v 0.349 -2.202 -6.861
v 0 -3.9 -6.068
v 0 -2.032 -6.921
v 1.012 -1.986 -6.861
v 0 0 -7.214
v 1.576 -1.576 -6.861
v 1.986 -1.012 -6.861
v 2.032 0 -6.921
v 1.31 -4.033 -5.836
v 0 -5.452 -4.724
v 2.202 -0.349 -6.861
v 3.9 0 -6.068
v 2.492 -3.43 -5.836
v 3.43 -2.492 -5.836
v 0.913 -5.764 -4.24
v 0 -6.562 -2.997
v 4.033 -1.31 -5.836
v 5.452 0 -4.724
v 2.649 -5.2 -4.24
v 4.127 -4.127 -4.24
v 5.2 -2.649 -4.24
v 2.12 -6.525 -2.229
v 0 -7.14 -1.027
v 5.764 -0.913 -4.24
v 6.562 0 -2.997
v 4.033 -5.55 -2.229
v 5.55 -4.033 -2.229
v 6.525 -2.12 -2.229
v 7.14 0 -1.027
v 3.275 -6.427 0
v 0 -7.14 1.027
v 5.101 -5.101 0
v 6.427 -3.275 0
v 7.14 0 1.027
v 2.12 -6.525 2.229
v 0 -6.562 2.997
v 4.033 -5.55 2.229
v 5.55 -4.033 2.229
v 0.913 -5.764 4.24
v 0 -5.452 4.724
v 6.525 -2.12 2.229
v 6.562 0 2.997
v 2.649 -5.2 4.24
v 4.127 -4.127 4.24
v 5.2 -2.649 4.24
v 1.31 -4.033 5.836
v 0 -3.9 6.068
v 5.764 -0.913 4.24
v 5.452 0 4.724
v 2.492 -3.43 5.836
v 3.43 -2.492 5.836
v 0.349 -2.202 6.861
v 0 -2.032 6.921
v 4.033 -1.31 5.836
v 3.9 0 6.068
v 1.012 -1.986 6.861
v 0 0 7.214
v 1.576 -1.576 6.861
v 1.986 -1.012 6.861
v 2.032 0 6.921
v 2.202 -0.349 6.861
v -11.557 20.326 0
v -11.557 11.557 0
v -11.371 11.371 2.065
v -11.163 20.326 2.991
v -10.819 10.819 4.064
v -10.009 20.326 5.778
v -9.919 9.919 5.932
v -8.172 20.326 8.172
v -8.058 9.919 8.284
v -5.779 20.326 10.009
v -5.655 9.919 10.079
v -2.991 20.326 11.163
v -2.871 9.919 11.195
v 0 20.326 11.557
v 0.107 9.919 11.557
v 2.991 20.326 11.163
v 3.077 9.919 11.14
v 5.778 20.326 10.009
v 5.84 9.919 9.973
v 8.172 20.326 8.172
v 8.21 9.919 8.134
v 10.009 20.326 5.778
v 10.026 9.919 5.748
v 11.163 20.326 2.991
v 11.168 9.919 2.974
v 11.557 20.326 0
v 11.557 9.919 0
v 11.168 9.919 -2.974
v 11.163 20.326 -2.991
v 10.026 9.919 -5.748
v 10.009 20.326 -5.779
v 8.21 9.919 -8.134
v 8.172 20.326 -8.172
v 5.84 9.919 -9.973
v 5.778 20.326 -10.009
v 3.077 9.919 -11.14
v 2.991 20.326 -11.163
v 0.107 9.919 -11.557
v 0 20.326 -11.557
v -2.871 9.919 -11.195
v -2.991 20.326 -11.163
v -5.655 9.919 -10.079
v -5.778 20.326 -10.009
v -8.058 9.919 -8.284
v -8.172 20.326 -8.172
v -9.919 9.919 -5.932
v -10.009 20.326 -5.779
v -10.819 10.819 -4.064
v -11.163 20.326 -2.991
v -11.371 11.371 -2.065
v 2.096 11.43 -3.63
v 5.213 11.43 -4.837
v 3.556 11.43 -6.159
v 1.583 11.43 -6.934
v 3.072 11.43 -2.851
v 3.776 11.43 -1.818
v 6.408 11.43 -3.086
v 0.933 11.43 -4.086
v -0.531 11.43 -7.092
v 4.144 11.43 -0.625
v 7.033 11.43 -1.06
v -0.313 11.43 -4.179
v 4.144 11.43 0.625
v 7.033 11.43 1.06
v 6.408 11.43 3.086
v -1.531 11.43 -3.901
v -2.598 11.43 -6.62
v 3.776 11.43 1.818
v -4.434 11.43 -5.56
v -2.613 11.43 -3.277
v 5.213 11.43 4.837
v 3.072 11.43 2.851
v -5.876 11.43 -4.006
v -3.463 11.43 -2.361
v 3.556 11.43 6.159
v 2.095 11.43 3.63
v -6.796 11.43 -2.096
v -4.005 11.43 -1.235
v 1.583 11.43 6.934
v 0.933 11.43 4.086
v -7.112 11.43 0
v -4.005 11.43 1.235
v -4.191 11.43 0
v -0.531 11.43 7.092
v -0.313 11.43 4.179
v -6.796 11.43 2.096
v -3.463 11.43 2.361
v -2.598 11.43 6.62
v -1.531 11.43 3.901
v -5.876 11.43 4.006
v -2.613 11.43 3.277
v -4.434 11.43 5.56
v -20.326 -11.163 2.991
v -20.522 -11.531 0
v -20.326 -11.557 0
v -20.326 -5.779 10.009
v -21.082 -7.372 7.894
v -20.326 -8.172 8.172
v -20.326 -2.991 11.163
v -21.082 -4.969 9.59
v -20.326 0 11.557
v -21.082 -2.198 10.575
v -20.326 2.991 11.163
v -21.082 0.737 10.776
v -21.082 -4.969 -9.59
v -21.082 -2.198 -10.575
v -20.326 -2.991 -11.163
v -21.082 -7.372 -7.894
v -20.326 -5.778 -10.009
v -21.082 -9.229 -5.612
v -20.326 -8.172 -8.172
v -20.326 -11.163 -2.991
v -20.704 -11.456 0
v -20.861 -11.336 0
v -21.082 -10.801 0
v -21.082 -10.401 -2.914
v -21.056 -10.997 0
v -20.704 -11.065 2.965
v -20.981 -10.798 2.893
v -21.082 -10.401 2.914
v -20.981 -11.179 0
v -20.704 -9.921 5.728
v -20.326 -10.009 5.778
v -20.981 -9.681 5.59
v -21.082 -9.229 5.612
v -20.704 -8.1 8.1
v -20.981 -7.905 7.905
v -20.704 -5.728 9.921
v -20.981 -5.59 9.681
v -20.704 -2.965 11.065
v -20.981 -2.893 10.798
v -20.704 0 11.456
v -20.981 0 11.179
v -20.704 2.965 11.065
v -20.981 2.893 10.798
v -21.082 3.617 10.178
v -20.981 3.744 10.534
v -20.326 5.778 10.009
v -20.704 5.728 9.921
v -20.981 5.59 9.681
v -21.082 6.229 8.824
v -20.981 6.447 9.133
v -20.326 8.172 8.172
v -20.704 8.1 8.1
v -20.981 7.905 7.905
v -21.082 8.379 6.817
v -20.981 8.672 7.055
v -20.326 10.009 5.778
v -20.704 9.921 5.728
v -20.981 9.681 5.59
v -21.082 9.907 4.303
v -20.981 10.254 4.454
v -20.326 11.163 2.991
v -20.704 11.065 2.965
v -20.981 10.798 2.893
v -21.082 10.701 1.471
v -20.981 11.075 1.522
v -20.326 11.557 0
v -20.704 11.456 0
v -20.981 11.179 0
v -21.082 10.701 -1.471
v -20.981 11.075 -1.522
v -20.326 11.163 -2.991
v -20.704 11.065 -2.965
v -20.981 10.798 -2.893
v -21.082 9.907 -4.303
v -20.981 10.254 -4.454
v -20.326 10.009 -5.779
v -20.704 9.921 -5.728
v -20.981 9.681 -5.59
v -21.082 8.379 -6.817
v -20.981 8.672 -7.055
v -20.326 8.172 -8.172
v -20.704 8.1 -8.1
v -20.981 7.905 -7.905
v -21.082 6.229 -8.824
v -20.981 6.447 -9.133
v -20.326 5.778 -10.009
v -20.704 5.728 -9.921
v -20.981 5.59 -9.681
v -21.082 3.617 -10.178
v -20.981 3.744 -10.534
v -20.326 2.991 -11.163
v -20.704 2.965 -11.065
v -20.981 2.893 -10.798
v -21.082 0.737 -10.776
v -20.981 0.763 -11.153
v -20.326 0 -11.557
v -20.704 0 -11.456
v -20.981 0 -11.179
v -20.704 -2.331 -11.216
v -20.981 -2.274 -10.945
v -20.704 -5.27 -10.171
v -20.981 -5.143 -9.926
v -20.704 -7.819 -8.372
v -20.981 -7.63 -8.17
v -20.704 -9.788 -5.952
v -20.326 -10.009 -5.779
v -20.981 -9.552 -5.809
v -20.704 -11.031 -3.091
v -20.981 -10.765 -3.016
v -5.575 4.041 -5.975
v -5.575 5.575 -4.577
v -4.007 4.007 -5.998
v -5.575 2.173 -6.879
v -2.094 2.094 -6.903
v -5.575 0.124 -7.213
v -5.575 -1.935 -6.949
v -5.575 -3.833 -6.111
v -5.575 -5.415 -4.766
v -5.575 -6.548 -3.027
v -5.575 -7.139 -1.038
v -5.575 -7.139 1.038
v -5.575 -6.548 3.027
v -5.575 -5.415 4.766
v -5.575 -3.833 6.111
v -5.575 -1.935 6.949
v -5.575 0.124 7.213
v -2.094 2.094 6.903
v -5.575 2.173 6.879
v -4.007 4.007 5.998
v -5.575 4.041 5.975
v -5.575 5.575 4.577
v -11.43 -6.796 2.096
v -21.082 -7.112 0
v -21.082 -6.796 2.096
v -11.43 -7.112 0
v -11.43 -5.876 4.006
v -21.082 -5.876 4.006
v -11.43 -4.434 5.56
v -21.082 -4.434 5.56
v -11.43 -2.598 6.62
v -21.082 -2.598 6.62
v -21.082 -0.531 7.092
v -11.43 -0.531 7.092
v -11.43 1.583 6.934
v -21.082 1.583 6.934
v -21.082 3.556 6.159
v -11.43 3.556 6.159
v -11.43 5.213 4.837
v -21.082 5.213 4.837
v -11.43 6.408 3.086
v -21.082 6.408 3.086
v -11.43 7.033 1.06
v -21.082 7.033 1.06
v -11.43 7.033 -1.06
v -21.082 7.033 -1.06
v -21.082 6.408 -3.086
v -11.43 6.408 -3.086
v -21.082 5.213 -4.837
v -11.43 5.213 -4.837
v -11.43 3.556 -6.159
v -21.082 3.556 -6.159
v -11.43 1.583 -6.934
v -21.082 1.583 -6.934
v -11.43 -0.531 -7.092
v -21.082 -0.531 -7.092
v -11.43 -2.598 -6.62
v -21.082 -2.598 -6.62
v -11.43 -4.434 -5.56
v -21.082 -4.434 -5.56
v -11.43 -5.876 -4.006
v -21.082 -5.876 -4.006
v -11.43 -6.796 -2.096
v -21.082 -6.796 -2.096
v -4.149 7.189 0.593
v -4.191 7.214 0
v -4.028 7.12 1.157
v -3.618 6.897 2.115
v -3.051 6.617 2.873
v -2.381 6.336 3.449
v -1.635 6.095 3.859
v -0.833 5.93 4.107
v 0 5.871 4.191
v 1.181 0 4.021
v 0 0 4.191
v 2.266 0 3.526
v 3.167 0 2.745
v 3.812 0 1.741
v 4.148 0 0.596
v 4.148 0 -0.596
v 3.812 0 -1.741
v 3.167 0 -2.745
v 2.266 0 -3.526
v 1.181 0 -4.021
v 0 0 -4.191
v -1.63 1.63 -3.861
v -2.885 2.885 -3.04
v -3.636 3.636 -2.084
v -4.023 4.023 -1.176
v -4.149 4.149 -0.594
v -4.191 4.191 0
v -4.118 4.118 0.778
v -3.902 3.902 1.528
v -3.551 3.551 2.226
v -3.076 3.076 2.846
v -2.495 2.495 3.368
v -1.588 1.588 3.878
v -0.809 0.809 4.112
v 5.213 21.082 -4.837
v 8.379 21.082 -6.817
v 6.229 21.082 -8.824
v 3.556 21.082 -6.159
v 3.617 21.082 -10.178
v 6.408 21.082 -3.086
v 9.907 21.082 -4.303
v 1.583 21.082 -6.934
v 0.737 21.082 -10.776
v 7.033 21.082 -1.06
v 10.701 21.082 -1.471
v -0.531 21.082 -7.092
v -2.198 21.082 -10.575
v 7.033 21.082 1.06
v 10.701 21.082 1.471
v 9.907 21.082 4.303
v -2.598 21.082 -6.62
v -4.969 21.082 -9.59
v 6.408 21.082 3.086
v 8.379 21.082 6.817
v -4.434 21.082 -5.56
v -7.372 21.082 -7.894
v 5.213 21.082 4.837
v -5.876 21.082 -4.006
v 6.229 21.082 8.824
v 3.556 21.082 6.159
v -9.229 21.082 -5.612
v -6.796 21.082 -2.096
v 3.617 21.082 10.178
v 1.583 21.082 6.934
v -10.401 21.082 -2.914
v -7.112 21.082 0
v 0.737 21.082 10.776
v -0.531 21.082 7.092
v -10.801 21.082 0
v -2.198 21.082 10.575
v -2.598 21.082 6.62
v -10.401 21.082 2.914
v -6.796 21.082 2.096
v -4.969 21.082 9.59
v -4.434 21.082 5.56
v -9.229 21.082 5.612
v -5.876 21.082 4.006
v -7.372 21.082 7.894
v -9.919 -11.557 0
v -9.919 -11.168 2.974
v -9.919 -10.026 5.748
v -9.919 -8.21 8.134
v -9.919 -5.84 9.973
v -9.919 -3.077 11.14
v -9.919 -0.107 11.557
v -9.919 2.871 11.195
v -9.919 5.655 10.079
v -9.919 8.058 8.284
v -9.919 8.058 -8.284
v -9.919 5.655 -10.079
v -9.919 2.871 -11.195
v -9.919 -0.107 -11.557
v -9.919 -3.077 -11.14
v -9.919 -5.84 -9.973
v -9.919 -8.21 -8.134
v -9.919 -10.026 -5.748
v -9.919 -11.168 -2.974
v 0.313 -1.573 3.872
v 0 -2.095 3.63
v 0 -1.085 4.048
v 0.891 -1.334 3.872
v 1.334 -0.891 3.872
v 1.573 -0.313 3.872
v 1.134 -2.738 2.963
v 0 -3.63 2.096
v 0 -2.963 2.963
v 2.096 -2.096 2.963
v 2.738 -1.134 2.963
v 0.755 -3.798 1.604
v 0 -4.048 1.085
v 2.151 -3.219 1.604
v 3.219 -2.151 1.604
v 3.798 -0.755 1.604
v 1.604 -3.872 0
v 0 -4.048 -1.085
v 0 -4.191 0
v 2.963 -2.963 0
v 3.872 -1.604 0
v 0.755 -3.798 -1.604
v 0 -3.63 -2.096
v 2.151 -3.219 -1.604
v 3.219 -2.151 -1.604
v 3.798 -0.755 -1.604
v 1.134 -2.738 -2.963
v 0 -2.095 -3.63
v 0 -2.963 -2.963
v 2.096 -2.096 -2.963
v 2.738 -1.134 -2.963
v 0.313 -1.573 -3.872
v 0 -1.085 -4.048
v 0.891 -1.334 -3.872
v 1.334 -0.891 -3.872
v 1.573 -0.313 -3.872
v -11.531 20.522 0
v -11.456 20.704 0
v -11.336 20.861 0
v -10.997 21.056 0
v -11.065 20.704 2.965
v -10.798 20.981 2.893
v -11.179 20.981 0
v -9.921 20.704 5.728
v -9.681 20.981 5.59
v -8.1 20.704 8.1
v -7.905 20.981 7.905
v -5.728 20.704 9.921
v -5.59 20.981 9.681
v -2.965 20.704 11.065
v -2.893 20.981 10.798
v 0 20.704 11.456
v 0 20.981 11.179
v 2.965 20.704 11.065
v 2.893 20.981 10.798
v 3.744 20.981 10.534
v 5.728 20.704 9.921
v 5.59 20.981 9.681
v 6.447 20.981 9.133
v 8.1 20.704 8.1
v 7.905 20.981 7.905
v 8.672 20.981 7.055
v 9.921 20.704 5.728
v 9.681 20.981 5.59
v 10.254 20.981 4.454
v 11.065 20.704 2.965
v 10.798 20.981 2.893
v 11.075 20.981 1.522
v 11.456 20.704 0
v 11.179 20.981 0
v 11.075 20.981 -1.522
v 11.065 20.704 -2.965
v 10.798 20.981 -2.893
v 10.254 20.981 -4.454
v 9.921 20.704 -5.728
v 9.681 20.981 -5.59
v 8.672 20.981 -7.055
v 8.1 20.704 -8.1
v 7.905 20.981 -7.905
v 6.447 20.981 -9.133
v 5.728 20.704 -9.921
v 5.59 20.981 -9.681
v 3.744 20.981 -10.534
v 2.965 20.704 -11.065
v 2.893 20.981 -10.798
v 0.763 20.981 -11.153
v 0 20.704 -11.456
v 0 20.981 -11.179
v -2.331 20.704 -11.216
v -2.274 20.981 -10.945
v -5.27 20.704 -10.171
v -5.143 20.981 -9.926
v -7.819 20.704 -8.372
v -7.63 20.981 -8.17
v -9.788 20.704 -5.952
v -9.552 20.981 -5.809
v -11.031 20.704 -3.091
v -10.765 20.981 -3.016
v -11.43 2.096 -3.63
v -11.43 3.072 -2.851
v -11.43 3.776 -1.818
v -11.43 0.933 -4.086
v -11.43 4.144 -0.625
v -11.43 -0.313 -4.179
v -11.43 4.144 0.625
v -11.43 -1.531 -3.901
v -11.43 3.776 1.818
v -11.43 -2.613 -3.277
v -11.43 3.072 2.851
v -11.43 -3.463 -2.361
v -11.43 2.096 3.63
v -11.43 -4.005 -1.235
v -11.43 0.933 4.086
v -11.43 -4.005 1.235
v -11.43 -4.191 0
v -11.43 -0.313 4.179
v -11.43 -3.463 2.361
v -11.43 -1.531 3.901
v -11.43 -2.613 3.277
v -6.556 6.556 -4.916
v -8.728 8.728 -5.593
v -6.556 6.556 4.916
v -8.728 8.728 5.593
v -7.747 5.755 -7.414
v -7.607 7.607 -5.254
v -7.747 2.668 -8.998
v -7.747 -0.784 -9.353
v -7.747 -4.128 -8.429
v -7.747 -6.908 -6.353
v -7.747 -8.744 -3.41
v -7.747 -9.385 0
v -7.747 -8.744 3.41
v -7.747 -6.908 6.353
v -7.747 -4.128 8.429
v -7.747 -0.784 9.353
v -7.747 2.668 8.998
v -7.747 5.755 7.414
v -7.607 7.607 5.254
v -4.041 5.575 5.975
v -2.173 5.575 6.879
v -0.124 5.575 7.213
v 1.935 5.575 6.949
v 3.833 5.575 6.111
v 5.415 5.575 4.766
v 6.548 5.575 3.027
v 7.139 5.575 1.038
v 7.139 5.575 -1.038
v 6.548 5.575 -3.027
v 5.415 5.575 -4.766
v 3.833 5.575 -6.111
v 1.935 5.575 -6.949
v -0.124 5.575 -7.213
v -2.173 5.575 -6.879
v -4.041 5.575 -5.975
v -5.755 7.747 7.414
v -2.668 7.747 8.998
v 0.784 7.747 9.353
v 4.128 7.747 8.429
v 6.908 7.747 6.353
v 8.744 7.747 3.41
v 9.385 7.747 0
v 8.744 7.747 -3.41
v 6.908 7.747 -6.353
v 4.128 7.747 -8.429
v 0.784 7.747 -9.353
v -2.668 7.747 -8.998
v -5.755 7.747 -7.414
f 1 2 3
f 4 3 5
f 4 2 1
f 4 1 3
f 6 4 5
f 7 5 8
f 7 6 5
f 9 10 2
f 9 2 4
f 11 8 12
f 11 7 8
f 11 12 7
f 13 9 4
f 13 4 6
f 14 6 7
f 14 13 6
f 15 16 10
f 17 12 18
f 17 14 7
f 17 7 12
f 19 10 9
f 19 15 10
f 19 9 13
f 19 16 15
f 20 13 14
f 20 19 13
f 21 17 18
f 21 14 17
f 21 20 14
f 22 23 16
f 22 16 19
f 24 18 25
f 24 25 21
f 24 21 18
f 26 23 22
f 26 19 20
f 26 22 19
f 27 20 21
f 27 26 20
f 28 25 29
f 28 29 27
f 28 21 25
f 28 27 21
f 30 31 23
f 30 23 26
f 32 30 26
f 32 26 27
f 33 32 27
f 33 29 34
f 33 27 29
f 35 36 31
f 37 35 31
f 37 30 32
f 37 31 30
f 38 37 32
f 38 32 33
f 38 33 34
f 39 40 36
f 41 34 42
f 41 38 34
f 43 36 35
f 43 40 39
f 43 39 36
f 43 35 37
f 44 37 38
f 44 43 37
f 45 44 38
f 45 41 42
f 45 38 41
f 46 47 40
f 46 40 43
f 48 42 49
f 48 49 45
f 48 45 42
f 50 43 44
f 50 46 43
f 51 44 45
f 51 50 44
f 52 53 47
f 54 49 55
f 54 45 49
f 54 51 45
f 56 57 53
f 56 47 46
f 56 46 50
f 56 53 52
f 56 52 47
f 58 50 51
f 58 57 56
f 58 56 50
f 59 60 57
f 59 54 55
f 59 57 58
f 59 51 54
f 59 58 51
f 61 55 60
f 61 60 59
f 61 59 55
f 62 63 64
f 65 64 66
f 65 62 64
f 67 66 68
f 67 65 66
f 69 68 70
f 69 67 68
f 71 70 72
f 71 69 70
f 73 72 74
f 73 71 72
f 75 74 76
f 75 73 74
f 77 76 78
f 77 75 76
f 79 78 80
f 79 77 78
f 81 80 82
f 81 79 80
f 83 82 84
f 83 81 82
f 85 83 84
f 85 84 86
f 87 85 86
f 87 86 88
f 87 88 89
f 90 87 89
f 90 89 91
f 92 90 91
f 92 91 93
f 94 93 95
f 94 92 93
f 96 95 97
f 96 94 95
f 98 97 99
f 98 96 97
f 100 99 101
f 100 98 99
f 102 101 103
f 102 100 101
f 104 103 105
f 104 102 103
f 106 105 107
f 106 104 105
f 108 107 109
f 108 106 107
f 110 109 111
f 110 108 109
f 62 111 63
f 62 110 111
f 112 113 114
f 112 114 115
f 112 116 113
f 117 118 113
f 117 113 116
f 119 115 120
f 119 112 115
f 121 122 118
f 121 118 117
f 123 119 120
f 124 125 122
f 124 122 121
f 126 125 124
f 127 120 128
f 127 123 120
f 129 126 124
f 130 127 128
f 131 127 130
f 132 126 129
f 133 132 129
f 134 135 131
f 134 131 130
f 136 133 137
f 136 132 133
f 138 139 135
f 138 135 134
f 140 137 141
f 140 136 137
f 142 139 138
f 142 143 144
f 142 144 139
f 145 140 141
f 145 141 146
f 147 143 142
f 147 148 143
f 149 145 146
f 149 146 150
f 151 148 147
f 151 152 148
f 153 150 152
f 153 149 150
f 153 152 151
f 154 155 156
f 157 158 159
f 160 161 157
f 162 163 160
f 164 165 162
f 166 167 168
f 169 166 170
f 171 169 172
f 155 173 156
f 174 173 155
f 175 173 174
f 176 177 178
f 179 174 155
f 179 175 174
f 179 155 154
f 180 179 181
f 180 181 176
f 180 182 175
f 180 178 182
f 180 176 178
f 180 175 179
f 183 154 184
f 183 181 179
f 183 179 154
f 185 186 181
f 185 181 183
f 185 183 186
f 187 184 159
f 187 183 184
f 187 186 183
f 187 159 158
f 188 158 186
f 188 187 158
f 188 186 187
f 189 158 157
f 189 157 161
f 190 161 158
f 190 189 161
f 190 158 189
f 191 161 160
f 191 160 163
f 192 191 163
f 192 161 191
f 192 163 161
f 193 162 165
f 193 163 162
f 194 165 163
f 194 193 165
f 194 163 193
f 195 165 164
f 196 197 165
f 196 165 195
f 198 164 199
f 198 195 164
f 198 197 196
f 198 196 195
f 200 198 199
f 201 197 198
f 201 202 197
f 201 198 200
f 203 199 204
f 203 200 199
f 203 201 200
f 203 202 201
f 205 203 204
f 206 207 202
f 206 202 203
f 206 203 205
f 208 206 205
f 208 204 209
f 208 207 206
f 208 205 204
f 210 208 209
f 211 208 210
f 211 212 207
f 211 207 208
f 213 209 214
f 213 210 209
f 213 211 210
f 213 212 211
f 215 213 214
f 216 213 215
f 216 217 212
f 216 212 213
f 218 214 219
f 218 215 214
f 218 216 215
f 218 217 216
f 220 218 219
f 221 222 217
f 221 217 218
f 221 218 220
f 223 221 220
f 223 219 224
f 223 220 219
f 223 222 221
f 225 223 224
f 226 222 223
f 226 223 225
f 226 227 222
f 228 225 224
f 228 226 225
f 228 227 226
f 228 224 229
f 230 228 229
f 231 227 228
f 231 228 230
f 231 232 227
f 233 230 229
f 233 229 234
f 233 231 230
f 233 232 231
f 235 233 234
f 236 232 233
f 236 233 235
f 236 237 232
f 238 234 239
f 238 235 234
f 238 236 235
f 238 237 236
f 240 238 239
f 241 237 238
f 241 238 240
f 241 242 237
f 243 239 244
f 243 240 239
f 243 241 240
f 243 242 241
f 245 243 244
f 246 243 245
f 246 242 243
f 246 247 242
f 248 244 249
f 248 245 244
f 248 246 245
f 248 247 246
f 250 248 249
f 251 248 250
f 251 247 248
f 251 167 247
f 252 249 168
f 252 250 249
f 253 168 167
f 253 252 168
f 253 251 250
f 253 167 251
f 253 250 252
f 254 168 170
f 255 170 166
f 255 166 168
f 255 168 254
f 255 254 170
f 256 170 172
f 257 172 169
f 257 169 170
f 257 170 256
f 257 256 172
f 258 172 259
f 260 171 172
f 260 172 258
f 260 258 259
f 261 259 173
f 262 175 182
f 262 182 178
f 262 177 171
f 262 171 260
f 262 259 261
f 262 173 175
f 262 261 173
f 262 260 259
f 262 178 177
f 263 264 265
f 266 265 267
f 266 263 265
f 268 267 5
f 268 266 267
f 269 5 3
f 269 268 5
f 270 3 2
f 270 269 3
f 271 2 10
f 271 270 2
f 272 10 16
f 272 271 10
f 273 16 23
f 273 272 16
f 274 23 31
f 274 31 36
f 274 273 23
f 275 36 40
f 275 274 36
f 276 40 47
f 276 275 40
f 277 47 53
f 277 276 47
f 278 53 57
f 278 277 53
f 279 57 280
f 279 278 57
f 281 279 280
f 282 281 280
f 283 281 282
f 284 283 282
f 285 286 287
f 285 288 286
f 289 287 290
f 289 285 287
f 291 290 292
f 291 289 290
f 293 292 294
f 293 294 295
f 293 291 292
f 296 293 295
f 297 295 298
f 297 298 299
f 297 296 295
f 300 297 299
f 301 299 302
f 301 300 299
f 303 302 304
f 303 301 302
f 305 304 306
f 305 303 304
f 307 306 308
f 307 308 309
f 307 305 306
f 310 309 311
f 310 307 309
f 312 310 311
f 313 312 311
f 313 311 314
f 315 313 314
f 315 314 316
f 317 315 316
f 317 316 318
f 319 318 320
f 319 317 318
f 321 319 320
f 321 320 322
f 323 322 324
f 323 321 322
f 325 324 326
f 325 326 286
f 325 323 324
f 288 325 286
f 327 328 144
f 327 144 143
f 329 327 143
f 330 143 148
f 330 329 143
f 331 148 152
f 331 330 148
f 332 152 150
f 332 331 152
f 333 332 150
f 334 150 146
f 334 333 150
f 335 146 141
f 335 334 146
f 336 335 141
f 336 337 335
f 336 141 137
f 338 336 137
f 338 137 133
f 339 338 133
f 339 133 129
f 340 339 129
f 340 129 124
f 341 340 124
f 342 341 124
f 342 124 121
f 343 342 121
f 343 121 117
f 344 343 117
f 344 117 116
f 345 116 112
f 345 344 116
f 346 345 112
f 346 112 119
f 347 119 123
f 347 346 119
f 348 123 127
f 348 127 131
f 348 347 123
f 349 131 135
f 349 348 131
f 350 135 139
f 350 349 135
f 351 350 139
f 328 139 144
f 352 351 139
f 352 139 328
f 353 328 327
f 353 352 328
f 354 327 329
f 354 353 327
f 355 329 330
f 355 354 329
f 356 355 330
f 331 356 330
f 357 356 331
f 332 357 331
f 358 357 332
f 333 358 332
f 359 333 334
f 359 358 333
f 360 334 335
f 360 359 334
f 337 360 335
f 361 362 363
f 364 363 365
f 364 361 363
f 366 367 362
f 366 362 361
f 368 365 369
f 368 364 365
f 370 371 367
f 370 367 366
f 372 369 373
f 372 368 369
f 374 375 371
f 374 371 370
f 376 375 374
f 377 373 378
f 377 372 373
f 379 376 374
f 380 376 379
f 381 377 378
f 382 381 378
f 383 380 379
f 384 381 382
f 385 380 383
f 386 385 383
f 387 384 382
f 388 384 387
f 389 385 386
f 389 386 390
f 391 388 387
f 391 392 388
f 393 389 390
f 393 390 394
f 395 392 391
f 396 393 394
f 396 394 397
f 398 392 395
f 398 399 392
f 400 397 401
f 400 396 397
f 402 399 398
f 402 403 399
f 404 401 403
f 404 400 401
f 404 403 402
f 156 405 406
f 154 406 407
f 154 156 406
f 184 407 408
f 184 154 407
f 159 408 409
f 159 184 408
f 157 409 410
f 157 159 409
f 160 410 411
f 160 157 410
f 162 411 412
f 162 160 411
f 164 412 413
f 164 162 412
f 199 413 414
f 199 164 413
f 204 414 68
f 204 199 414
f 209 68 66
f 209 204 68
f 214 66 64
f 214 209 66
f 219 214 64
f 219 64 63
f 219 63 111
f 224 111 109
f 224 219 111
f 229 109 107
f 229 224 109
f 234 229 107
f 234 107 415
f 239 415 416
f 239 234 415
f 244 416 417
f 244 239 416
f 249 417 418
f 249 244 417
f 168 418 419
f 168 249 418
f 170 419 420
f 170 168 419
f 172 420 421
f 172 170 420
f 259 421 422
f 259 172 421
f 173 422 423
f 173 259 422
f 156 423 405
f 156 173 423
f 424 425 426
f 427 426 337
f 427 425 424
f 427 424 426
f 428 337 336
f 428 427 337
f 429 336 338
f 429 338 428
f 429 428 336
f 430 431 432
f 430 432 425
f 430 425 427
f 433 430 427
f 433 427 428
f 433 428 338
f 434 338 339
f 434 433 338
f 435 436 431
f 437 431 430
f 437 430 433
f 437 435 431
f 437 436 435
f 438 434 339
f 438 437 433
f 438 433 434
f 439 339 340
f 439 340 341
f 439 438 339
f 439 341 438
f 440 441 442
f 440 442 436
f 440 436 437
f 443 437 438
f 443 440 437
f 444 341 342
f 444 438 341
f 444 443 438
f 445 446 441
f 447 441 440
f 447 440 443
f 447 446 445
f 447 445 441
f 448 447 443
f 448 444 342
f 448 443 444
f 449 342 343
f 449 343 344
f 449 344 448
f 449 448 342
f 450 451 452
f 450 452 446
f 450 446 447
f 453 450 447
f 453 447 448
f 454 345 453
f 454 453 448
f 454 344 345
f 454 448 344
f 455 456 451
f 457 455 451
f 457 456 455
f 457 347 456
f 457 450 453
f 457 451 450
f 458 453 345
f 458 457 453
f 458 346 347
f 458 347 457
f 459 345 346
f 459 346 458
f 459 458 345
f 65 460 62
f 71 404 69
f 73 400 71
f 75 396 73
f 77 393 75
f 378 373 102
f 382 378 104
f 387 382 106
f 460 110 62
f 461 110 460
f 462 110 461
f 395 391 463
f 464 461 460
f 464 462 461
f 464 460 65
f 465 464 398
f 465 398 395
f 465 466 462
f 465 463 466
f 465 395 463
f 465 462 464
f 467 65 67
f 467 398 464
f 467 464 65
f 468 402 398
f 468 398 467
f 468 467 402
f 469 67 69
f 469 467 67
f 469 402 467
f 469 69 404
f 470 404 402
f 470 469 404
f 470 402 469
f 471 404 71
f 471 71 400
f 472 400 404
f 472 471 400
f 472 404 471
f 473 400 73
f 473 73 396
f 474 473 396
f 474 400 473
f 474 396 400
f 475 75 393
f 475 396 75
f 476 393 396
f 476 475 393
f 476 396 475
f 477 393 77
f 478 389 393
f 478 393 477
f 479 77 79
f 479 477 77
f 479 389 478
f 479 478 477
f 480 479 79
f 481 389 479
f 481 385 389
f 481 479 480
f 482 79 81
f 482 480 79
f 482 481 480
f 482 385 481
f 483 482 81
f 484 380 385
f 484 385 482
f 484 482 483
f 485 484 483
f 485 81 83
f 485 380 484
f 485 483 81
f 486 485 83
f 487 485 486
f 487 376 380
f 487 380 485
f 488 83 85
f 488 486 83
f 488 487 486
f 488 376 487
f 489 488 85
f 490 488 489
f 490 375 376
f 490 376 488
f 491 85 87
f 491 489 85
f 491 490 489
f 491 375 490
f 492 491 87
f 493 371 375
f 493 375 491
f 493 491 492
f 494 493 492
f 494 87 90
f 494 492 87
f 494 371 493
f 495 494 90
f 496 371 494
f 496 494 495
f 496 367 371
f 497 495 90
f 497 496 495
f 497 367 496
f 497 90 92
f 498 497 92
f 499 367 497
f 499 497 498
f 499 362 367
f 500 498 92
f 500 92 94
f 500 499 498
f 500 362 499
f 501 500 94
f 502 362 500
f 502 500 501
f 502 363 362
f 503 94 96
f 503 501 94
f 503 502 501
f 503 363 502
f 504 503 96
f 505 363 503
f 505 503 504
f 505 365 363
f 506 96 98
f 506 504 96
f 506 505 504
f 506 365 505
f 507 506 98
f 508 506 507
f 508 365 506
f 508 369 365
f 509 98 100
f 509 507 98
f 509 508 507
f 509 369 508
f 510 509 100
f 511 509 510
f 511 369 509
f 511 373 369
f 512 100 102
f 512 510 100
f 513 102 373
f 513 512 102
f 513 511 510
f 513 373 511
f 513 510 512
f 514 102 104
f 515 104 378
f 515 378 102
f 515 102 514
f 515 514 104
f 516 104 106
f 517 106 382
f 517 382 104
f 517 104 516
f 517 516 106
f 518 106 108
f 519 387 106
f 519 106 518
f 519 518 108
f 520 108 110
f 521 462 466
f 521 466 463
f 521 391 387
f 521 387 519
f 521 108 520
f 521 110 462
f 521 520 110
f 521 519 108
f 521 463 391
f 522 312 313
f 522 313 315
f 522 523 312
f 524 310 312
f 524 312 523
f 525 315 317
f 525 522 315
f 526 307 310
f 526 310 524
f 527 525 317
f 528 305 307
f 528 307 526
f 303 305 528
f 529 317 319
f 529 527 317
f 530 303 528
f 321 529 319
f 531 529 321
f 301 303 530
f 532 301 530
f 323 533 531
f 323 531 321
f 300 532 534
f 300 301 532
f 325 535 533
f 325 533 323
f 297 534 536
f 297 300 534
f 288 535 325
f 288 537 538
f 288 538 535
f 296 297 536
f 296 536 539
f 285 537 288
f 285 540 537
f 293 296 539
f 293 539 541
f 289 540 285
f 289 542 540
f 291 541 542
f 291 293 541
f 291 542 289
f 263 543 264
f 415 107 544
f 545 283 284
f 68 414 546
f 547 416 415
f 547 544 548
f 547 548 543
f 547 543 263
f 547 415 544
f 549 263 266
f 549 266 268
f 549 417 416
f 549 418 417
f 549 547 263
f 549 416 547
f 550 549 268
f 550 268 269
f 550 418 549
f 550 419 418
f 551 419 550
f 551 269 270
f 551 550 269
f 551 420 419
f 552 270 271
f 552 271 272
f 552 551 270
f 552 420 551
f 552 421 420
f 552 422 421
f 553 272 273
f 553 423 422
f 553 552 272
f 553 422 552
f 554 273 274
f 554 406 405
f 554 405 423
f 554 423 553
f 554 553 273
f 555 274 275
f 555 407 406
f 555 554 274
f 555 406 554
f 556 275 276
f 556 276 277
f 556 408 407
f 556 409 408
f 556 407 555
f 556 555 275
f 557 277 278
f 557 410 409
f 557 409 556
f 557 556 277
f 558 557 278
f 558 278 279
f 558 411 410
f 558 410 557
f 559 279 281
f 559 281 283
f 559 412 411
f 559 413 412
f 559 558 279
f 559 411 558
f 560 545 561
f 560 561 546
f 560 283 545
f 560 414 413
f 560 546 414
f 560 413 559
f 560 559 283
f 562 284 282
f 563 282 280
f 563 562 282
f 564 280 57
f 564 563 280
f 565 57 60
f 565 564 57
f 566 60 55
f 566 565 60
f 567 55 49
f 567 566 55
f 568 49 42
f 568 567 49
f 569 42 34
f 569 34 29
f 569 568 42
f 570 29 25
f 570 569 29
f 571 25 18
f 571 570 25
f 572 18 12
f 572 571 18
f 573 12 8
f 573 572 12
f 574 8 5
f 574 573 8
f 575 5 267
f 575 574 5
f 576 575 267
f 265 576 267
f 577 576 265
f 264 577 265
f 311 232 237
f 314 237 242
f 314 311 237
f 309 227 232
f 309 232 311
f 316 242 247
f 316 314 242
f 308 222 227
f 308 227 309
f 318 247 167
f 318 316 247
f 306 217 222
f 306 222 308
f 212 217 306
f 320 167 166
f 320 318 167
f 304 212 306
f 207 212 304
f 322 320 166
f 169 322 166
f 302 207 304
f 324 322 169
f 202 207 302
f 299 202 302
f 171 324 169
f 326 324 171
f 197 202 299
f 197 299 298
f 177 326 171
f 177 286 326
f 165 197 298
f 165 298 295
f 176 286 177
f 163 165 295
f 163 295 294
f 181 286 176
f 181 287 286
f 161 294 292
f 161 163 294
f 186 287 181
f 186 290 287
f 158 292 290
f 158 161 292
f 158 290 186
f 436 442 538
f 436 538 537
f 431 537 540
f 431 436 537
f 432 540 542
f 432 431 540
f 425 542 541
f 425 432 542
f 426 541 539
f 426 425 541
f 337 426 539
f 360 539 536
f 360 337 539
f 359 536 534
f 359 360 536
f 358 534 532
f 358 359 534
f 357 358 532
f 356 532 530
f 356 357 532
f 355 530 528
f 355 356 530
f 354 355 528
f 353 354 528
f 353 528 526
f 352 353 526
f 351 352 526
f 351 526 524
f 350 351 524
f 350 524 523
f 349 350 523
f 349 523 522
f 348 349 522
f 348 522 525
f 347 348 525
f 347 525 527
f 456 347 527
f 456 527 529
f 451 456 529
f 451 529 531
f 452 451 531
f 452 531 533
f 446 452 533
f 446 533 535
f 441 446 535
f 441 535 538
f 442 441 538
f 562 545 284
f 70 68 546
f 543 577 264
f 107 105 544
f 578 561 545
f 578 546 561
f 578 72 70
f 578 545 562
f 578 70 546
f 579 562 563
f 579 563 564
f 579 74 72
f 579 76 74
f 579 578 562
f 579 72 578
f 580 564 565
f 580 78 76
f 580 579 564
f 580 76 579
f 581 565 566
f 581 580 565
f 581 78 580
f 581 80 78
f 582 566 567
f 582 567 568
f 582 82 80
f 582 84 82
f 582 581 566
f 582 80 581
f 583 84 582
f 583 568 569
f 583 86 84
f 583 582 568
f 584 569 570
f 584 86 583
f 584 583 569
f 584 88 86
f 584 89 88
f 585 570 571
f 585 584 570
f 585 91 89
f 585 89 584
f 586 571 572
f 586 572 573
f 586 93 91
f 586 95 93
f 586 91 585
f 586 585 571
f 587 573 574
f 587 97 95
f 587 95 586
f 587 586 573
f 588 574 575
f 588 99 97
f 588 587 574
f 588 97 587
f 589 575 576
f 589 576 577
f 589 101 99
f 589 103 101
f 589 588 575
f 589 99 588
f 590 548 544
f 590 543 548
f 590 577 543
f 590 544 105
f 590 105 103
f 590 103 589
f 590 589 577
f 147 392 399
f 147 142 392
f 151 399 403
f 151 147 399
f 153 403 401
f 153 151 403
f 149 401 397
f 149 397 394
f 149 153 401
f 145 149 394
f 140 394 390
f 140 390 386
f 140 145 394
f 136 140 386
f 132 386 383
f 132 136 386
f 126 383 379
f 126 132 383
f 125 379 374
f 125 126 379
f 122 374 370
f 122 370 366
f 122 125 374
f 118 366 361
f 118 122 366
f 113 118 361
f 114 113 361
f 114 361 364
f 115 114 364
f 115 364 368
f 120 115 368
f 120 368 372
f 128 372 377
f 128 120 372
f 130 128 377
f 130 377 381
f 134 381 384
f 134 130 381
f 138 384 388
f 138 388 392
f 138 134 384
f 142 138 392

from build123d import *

# Parameters (mm, degrees)
CIRPATTERN2_COUNT  = 2
CIRPATTERN2_ANGLE  = 90
SKETCH4_R          = 4.191
CUT_EXTRUDE1_DEPTH = 22.082
SKETCH5_R          = 4.191
CUT_EXTRUDE2_DEPTH = 22.082
REVOLVE2_ANGLE     = 90


with BuildPart() as part:
    # Sketch2 → Revolve1 (revolve)
    with BuildSketch(Plane.XY):
        with BuildLine():
            Line((-21.082, -7.112), (-11.43, -7.112))
            Line((-11.43, -7.112), (-11.43, -4.191))
            Line((-11.43, -4.191), (0, -4.191))
            Line((0, -4.191), (0, -7.2136))
            Line((0, -7.2136), (-5.5753, -7.2136))
            Line((-5.5753, -7.2136), (-9.9187, -11.557))
            Line((-9.9187, -11.557), (-20.32635, -11.557))
            ThreePointArc((-20.32635, -11.557), (-20.860675239, -11.335675239), (-21.082, -10.80135))
            Line((-21.082, -10.80135), (-21.082, -7.112))
        make_face()
    revolve(axis=Axis((0, 0, 0), (-1, 0, 0)))


with BuildPart() as cirpattern2_1:
    # CirPattern2: pattern copy
    add(part.part.rotate(Axis((0, 0, -11.557), (0, 0, -1)), 1 * CIRPATTERN2_ANGLE / (CIRPATTERN2_COUNT - 1)))

    # Sketch4 → Cut-Extrude1 (cut, through all)
    with BuildSketch(Plane(origin=(0, 0, 0), x_dir=(0, 0, -1), z_dir=(1, 0, 0))):
        Circle(SKETCH4_R)
    extrude(amount=-CUT_EXTRUDE1_DEPTH, mode=Mode.SUBTRACT)


with BuildPart() as part_1:
    add(part.part)

    # Sketch5 → Cut-Extrude2 (cut, through all)
    with BuildSketch(Plane.XZ):
        Circle(SKETCH5_R)
    extrude(amount=-CUT_EXTRUDE2_DEPTH, mode=Mode.SUBTRACT)

    # Combine1: union CirPattern2_1
    add(cirpattern2_1.part)

    # Sketch6 → Revolve2 (revolve)
    with BuildSketch(Plane(origin=(0, 0, 0), x_dir=(0, 0, -1), z_dir=(1, 0, 0))):
        with BuildLine():
            Line((-7.2136, 0), (-4.191, 0))
            ThreePointArc((-4.191, 0), (0, -4.191), (4.191, 0))
            Line((4.191, 0), (7.2136, 0))
            ThreePointArc((7.2136, 0), (0, -7.2136), (-7.2136, 0))
        make_face()
    revolve(axis=Axis((0, 0, 4.191), (0, 0, 1)), revolution_arc=REVOLVE2_ANGLE)


solid = part_1.part
